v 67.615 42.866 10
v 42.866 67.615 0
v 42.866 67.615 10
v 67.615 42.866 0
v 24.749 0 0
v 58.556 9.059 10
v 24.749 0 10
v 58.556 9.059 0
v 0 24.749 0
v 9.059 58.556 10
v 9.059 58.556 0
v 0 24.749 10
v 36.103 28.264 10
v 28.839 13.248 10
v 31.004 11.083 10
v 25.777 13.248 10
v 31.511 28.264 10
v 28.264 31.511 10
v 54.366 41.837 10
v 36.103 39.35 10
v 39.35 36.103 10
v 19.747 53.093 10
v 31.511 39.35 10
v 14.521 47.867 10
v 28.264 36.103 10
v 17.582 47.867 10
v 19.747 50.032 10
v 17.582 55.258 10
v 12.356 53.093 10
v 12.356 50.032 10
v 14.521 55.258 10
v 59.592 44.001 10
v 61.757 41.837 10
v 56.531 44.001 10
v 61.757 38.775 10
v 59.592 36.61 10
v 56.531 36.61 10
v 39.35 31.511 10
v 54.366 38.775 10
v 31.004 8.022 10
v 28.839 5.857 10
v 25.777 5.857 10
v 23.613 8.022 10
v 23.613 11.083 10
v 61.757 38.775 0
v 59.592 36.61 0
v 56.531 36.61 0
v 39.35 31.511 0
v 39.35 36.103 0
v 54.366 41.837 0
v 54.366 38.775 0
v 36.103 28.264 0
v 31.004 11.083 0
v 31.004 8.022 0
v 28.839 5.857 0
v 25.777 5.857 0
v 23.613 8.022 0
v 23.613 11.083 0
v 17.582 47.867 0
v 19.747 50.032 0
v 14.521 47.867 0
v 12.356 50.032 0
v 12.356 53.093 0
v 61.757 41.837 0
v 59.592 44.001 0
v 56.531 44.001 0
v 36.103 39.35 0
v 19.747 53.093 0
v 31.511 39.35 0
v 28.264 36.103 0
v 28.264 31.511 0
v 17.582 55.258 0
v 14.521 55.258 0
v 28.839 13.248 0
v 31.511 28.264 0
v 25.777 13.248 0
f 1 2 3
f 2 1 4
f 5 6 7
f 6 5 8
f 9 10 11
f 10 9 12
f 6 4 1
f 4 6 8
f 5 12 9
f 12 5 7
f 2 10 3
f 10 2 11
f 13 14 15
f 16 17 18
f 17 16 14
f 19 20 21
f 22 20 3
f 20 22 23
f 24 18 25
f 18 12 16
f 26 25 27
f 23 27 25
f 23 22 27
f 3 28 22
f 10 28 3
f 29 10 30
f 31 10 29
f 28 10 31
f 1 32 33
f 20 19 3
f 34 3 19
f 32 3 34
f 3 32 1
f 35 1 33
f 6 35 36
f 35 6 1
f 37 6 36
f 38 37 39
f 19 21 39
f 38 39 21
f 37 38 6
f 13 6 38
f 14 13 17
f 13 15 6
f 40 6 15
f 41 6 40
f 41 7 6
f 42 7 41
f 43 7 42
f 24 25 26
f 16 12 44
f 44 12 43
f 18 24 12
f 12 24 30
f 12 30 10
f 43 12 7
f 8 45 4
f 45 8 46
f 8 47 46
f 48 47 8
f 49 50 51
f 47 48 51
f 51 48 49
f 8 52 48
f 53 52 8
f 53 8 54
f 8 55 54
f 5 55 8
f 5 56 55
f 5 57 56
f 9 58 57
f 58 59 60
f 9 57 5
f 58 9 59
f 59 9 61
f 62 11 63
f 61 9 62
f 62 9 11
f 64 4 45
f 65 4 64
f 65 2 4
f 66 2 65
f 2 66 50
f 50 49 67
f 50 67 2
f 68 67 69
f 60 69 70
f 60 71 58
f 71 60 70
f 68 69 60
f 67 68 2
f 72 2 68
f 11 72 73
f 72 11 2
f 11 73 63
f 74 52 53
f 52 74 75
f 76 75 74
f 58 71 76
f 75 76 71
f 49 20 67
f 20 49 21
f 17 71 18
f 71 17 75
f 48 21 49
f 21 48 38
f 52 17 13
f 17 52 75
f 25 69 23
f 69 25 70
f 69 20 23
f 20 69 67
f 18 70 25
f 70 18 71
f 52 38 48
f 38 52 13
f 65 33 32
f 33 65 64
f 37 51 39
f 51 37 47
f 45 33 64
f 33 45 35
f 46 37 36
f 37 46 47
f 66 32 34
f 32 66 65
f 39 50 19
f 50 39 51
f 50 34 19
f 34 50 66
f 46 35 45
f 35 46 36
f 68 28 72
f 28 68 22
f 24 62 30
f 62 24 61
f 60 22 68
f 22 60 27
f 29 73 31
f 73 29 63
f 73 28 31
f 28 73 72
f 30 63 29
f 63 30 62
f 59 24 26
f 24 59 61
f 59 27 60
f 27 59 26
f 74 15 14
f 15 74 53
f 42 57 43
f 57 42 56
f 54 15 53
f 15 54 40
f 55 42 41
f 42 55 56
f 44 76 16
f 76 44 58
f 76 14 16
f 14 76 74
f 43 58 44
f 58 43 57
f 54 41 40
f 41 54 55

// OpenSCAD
$fn = 32;

// ----------------------------------------------------------------------
// Polygon plate: 6-gon R35, 3 bolt windows
// ----------------------------------------------------------------------

// --- parameters (mm) ---
sides = 6;                // number of polygon sides
plate_r = 35;             // circumscribed radius of the polygon
bore_r = 6;               // centre bore radius
bolts = 3;                // number of bolt windows
ring_r = 25.11;           // bolt-circle radius
bolt_r = 4;               // bolt window radius
plate_t = 10;             // plate thickness, Z (extrusion height)

plate_d = 2 * plate_r;  // circumscribed diameter
bore_d = 2 * bore_r;  // centre bore diameter
bolt_d = 2 * bolt_r;  // bolt window diameter
ring_d = 2 * ring_r;  // bolt-circle diameter

profile = [[67.615, 42.866], [42.866, 67.615], [9.059, 58.556], [0, 24.749], [24.749, 0], [58.556, 9.059]];  // primary outline, 6 points, counter clockwise
void_1 = [[39.35, 36.103], [36.103, 39.35], [31.511, 39.35], [28.264, 36.103], [28.264, 31.511], [31.511, 28.264], [36.103, 28.264], [39.35, 31.511]];  // centre bore, 8 points
void_2 = [[61.757, 41.837], [59.592, 44.001], [56.531, 44.001], [54.366, 41.837], [54.366, 38.775], [56.531, 36.61], [59.592, 36.61], [61.757, 38.775]];  // bolt window 1, 8 points
void_3 = [[19.747, 53.093], [17.582, 55.258], [14.521, 55.258], [12.356, 53.093], [12.356, 50.032], [14.521, 47.867], [17.582, 47.867], [19.747, 50.032]];  // bolt window 2, 8 points
void_4 = [[31.004, 11.083], [28.839, 13.248], [25.777, 13.248], [23.613, 11.083], [23.613, 8.022], [25.777, 5.857], [28.839, 5.857], [31.004, 8.022]];  // bolt window 3, 8 points

// --- the one profile operation ---
difference() {
  linear_extrude(height = plate_t) polygon(points = profile);
  translate([0, 0, -1])
    linear_extrude(height = plate_t + 2) polygon(points = void_1);
  translate([0, 0, -1])
    linear_extrude(height = plate_t + 2) polygon(points = void_2);
  translate([0, 0, -1])
    linear_extrude(height = plate_t + 2) polygon(points = void_3);
  translate([0, 0, -1])
    linear_extrude(height = plate_t + 2) polygon(points = void_4);
}
